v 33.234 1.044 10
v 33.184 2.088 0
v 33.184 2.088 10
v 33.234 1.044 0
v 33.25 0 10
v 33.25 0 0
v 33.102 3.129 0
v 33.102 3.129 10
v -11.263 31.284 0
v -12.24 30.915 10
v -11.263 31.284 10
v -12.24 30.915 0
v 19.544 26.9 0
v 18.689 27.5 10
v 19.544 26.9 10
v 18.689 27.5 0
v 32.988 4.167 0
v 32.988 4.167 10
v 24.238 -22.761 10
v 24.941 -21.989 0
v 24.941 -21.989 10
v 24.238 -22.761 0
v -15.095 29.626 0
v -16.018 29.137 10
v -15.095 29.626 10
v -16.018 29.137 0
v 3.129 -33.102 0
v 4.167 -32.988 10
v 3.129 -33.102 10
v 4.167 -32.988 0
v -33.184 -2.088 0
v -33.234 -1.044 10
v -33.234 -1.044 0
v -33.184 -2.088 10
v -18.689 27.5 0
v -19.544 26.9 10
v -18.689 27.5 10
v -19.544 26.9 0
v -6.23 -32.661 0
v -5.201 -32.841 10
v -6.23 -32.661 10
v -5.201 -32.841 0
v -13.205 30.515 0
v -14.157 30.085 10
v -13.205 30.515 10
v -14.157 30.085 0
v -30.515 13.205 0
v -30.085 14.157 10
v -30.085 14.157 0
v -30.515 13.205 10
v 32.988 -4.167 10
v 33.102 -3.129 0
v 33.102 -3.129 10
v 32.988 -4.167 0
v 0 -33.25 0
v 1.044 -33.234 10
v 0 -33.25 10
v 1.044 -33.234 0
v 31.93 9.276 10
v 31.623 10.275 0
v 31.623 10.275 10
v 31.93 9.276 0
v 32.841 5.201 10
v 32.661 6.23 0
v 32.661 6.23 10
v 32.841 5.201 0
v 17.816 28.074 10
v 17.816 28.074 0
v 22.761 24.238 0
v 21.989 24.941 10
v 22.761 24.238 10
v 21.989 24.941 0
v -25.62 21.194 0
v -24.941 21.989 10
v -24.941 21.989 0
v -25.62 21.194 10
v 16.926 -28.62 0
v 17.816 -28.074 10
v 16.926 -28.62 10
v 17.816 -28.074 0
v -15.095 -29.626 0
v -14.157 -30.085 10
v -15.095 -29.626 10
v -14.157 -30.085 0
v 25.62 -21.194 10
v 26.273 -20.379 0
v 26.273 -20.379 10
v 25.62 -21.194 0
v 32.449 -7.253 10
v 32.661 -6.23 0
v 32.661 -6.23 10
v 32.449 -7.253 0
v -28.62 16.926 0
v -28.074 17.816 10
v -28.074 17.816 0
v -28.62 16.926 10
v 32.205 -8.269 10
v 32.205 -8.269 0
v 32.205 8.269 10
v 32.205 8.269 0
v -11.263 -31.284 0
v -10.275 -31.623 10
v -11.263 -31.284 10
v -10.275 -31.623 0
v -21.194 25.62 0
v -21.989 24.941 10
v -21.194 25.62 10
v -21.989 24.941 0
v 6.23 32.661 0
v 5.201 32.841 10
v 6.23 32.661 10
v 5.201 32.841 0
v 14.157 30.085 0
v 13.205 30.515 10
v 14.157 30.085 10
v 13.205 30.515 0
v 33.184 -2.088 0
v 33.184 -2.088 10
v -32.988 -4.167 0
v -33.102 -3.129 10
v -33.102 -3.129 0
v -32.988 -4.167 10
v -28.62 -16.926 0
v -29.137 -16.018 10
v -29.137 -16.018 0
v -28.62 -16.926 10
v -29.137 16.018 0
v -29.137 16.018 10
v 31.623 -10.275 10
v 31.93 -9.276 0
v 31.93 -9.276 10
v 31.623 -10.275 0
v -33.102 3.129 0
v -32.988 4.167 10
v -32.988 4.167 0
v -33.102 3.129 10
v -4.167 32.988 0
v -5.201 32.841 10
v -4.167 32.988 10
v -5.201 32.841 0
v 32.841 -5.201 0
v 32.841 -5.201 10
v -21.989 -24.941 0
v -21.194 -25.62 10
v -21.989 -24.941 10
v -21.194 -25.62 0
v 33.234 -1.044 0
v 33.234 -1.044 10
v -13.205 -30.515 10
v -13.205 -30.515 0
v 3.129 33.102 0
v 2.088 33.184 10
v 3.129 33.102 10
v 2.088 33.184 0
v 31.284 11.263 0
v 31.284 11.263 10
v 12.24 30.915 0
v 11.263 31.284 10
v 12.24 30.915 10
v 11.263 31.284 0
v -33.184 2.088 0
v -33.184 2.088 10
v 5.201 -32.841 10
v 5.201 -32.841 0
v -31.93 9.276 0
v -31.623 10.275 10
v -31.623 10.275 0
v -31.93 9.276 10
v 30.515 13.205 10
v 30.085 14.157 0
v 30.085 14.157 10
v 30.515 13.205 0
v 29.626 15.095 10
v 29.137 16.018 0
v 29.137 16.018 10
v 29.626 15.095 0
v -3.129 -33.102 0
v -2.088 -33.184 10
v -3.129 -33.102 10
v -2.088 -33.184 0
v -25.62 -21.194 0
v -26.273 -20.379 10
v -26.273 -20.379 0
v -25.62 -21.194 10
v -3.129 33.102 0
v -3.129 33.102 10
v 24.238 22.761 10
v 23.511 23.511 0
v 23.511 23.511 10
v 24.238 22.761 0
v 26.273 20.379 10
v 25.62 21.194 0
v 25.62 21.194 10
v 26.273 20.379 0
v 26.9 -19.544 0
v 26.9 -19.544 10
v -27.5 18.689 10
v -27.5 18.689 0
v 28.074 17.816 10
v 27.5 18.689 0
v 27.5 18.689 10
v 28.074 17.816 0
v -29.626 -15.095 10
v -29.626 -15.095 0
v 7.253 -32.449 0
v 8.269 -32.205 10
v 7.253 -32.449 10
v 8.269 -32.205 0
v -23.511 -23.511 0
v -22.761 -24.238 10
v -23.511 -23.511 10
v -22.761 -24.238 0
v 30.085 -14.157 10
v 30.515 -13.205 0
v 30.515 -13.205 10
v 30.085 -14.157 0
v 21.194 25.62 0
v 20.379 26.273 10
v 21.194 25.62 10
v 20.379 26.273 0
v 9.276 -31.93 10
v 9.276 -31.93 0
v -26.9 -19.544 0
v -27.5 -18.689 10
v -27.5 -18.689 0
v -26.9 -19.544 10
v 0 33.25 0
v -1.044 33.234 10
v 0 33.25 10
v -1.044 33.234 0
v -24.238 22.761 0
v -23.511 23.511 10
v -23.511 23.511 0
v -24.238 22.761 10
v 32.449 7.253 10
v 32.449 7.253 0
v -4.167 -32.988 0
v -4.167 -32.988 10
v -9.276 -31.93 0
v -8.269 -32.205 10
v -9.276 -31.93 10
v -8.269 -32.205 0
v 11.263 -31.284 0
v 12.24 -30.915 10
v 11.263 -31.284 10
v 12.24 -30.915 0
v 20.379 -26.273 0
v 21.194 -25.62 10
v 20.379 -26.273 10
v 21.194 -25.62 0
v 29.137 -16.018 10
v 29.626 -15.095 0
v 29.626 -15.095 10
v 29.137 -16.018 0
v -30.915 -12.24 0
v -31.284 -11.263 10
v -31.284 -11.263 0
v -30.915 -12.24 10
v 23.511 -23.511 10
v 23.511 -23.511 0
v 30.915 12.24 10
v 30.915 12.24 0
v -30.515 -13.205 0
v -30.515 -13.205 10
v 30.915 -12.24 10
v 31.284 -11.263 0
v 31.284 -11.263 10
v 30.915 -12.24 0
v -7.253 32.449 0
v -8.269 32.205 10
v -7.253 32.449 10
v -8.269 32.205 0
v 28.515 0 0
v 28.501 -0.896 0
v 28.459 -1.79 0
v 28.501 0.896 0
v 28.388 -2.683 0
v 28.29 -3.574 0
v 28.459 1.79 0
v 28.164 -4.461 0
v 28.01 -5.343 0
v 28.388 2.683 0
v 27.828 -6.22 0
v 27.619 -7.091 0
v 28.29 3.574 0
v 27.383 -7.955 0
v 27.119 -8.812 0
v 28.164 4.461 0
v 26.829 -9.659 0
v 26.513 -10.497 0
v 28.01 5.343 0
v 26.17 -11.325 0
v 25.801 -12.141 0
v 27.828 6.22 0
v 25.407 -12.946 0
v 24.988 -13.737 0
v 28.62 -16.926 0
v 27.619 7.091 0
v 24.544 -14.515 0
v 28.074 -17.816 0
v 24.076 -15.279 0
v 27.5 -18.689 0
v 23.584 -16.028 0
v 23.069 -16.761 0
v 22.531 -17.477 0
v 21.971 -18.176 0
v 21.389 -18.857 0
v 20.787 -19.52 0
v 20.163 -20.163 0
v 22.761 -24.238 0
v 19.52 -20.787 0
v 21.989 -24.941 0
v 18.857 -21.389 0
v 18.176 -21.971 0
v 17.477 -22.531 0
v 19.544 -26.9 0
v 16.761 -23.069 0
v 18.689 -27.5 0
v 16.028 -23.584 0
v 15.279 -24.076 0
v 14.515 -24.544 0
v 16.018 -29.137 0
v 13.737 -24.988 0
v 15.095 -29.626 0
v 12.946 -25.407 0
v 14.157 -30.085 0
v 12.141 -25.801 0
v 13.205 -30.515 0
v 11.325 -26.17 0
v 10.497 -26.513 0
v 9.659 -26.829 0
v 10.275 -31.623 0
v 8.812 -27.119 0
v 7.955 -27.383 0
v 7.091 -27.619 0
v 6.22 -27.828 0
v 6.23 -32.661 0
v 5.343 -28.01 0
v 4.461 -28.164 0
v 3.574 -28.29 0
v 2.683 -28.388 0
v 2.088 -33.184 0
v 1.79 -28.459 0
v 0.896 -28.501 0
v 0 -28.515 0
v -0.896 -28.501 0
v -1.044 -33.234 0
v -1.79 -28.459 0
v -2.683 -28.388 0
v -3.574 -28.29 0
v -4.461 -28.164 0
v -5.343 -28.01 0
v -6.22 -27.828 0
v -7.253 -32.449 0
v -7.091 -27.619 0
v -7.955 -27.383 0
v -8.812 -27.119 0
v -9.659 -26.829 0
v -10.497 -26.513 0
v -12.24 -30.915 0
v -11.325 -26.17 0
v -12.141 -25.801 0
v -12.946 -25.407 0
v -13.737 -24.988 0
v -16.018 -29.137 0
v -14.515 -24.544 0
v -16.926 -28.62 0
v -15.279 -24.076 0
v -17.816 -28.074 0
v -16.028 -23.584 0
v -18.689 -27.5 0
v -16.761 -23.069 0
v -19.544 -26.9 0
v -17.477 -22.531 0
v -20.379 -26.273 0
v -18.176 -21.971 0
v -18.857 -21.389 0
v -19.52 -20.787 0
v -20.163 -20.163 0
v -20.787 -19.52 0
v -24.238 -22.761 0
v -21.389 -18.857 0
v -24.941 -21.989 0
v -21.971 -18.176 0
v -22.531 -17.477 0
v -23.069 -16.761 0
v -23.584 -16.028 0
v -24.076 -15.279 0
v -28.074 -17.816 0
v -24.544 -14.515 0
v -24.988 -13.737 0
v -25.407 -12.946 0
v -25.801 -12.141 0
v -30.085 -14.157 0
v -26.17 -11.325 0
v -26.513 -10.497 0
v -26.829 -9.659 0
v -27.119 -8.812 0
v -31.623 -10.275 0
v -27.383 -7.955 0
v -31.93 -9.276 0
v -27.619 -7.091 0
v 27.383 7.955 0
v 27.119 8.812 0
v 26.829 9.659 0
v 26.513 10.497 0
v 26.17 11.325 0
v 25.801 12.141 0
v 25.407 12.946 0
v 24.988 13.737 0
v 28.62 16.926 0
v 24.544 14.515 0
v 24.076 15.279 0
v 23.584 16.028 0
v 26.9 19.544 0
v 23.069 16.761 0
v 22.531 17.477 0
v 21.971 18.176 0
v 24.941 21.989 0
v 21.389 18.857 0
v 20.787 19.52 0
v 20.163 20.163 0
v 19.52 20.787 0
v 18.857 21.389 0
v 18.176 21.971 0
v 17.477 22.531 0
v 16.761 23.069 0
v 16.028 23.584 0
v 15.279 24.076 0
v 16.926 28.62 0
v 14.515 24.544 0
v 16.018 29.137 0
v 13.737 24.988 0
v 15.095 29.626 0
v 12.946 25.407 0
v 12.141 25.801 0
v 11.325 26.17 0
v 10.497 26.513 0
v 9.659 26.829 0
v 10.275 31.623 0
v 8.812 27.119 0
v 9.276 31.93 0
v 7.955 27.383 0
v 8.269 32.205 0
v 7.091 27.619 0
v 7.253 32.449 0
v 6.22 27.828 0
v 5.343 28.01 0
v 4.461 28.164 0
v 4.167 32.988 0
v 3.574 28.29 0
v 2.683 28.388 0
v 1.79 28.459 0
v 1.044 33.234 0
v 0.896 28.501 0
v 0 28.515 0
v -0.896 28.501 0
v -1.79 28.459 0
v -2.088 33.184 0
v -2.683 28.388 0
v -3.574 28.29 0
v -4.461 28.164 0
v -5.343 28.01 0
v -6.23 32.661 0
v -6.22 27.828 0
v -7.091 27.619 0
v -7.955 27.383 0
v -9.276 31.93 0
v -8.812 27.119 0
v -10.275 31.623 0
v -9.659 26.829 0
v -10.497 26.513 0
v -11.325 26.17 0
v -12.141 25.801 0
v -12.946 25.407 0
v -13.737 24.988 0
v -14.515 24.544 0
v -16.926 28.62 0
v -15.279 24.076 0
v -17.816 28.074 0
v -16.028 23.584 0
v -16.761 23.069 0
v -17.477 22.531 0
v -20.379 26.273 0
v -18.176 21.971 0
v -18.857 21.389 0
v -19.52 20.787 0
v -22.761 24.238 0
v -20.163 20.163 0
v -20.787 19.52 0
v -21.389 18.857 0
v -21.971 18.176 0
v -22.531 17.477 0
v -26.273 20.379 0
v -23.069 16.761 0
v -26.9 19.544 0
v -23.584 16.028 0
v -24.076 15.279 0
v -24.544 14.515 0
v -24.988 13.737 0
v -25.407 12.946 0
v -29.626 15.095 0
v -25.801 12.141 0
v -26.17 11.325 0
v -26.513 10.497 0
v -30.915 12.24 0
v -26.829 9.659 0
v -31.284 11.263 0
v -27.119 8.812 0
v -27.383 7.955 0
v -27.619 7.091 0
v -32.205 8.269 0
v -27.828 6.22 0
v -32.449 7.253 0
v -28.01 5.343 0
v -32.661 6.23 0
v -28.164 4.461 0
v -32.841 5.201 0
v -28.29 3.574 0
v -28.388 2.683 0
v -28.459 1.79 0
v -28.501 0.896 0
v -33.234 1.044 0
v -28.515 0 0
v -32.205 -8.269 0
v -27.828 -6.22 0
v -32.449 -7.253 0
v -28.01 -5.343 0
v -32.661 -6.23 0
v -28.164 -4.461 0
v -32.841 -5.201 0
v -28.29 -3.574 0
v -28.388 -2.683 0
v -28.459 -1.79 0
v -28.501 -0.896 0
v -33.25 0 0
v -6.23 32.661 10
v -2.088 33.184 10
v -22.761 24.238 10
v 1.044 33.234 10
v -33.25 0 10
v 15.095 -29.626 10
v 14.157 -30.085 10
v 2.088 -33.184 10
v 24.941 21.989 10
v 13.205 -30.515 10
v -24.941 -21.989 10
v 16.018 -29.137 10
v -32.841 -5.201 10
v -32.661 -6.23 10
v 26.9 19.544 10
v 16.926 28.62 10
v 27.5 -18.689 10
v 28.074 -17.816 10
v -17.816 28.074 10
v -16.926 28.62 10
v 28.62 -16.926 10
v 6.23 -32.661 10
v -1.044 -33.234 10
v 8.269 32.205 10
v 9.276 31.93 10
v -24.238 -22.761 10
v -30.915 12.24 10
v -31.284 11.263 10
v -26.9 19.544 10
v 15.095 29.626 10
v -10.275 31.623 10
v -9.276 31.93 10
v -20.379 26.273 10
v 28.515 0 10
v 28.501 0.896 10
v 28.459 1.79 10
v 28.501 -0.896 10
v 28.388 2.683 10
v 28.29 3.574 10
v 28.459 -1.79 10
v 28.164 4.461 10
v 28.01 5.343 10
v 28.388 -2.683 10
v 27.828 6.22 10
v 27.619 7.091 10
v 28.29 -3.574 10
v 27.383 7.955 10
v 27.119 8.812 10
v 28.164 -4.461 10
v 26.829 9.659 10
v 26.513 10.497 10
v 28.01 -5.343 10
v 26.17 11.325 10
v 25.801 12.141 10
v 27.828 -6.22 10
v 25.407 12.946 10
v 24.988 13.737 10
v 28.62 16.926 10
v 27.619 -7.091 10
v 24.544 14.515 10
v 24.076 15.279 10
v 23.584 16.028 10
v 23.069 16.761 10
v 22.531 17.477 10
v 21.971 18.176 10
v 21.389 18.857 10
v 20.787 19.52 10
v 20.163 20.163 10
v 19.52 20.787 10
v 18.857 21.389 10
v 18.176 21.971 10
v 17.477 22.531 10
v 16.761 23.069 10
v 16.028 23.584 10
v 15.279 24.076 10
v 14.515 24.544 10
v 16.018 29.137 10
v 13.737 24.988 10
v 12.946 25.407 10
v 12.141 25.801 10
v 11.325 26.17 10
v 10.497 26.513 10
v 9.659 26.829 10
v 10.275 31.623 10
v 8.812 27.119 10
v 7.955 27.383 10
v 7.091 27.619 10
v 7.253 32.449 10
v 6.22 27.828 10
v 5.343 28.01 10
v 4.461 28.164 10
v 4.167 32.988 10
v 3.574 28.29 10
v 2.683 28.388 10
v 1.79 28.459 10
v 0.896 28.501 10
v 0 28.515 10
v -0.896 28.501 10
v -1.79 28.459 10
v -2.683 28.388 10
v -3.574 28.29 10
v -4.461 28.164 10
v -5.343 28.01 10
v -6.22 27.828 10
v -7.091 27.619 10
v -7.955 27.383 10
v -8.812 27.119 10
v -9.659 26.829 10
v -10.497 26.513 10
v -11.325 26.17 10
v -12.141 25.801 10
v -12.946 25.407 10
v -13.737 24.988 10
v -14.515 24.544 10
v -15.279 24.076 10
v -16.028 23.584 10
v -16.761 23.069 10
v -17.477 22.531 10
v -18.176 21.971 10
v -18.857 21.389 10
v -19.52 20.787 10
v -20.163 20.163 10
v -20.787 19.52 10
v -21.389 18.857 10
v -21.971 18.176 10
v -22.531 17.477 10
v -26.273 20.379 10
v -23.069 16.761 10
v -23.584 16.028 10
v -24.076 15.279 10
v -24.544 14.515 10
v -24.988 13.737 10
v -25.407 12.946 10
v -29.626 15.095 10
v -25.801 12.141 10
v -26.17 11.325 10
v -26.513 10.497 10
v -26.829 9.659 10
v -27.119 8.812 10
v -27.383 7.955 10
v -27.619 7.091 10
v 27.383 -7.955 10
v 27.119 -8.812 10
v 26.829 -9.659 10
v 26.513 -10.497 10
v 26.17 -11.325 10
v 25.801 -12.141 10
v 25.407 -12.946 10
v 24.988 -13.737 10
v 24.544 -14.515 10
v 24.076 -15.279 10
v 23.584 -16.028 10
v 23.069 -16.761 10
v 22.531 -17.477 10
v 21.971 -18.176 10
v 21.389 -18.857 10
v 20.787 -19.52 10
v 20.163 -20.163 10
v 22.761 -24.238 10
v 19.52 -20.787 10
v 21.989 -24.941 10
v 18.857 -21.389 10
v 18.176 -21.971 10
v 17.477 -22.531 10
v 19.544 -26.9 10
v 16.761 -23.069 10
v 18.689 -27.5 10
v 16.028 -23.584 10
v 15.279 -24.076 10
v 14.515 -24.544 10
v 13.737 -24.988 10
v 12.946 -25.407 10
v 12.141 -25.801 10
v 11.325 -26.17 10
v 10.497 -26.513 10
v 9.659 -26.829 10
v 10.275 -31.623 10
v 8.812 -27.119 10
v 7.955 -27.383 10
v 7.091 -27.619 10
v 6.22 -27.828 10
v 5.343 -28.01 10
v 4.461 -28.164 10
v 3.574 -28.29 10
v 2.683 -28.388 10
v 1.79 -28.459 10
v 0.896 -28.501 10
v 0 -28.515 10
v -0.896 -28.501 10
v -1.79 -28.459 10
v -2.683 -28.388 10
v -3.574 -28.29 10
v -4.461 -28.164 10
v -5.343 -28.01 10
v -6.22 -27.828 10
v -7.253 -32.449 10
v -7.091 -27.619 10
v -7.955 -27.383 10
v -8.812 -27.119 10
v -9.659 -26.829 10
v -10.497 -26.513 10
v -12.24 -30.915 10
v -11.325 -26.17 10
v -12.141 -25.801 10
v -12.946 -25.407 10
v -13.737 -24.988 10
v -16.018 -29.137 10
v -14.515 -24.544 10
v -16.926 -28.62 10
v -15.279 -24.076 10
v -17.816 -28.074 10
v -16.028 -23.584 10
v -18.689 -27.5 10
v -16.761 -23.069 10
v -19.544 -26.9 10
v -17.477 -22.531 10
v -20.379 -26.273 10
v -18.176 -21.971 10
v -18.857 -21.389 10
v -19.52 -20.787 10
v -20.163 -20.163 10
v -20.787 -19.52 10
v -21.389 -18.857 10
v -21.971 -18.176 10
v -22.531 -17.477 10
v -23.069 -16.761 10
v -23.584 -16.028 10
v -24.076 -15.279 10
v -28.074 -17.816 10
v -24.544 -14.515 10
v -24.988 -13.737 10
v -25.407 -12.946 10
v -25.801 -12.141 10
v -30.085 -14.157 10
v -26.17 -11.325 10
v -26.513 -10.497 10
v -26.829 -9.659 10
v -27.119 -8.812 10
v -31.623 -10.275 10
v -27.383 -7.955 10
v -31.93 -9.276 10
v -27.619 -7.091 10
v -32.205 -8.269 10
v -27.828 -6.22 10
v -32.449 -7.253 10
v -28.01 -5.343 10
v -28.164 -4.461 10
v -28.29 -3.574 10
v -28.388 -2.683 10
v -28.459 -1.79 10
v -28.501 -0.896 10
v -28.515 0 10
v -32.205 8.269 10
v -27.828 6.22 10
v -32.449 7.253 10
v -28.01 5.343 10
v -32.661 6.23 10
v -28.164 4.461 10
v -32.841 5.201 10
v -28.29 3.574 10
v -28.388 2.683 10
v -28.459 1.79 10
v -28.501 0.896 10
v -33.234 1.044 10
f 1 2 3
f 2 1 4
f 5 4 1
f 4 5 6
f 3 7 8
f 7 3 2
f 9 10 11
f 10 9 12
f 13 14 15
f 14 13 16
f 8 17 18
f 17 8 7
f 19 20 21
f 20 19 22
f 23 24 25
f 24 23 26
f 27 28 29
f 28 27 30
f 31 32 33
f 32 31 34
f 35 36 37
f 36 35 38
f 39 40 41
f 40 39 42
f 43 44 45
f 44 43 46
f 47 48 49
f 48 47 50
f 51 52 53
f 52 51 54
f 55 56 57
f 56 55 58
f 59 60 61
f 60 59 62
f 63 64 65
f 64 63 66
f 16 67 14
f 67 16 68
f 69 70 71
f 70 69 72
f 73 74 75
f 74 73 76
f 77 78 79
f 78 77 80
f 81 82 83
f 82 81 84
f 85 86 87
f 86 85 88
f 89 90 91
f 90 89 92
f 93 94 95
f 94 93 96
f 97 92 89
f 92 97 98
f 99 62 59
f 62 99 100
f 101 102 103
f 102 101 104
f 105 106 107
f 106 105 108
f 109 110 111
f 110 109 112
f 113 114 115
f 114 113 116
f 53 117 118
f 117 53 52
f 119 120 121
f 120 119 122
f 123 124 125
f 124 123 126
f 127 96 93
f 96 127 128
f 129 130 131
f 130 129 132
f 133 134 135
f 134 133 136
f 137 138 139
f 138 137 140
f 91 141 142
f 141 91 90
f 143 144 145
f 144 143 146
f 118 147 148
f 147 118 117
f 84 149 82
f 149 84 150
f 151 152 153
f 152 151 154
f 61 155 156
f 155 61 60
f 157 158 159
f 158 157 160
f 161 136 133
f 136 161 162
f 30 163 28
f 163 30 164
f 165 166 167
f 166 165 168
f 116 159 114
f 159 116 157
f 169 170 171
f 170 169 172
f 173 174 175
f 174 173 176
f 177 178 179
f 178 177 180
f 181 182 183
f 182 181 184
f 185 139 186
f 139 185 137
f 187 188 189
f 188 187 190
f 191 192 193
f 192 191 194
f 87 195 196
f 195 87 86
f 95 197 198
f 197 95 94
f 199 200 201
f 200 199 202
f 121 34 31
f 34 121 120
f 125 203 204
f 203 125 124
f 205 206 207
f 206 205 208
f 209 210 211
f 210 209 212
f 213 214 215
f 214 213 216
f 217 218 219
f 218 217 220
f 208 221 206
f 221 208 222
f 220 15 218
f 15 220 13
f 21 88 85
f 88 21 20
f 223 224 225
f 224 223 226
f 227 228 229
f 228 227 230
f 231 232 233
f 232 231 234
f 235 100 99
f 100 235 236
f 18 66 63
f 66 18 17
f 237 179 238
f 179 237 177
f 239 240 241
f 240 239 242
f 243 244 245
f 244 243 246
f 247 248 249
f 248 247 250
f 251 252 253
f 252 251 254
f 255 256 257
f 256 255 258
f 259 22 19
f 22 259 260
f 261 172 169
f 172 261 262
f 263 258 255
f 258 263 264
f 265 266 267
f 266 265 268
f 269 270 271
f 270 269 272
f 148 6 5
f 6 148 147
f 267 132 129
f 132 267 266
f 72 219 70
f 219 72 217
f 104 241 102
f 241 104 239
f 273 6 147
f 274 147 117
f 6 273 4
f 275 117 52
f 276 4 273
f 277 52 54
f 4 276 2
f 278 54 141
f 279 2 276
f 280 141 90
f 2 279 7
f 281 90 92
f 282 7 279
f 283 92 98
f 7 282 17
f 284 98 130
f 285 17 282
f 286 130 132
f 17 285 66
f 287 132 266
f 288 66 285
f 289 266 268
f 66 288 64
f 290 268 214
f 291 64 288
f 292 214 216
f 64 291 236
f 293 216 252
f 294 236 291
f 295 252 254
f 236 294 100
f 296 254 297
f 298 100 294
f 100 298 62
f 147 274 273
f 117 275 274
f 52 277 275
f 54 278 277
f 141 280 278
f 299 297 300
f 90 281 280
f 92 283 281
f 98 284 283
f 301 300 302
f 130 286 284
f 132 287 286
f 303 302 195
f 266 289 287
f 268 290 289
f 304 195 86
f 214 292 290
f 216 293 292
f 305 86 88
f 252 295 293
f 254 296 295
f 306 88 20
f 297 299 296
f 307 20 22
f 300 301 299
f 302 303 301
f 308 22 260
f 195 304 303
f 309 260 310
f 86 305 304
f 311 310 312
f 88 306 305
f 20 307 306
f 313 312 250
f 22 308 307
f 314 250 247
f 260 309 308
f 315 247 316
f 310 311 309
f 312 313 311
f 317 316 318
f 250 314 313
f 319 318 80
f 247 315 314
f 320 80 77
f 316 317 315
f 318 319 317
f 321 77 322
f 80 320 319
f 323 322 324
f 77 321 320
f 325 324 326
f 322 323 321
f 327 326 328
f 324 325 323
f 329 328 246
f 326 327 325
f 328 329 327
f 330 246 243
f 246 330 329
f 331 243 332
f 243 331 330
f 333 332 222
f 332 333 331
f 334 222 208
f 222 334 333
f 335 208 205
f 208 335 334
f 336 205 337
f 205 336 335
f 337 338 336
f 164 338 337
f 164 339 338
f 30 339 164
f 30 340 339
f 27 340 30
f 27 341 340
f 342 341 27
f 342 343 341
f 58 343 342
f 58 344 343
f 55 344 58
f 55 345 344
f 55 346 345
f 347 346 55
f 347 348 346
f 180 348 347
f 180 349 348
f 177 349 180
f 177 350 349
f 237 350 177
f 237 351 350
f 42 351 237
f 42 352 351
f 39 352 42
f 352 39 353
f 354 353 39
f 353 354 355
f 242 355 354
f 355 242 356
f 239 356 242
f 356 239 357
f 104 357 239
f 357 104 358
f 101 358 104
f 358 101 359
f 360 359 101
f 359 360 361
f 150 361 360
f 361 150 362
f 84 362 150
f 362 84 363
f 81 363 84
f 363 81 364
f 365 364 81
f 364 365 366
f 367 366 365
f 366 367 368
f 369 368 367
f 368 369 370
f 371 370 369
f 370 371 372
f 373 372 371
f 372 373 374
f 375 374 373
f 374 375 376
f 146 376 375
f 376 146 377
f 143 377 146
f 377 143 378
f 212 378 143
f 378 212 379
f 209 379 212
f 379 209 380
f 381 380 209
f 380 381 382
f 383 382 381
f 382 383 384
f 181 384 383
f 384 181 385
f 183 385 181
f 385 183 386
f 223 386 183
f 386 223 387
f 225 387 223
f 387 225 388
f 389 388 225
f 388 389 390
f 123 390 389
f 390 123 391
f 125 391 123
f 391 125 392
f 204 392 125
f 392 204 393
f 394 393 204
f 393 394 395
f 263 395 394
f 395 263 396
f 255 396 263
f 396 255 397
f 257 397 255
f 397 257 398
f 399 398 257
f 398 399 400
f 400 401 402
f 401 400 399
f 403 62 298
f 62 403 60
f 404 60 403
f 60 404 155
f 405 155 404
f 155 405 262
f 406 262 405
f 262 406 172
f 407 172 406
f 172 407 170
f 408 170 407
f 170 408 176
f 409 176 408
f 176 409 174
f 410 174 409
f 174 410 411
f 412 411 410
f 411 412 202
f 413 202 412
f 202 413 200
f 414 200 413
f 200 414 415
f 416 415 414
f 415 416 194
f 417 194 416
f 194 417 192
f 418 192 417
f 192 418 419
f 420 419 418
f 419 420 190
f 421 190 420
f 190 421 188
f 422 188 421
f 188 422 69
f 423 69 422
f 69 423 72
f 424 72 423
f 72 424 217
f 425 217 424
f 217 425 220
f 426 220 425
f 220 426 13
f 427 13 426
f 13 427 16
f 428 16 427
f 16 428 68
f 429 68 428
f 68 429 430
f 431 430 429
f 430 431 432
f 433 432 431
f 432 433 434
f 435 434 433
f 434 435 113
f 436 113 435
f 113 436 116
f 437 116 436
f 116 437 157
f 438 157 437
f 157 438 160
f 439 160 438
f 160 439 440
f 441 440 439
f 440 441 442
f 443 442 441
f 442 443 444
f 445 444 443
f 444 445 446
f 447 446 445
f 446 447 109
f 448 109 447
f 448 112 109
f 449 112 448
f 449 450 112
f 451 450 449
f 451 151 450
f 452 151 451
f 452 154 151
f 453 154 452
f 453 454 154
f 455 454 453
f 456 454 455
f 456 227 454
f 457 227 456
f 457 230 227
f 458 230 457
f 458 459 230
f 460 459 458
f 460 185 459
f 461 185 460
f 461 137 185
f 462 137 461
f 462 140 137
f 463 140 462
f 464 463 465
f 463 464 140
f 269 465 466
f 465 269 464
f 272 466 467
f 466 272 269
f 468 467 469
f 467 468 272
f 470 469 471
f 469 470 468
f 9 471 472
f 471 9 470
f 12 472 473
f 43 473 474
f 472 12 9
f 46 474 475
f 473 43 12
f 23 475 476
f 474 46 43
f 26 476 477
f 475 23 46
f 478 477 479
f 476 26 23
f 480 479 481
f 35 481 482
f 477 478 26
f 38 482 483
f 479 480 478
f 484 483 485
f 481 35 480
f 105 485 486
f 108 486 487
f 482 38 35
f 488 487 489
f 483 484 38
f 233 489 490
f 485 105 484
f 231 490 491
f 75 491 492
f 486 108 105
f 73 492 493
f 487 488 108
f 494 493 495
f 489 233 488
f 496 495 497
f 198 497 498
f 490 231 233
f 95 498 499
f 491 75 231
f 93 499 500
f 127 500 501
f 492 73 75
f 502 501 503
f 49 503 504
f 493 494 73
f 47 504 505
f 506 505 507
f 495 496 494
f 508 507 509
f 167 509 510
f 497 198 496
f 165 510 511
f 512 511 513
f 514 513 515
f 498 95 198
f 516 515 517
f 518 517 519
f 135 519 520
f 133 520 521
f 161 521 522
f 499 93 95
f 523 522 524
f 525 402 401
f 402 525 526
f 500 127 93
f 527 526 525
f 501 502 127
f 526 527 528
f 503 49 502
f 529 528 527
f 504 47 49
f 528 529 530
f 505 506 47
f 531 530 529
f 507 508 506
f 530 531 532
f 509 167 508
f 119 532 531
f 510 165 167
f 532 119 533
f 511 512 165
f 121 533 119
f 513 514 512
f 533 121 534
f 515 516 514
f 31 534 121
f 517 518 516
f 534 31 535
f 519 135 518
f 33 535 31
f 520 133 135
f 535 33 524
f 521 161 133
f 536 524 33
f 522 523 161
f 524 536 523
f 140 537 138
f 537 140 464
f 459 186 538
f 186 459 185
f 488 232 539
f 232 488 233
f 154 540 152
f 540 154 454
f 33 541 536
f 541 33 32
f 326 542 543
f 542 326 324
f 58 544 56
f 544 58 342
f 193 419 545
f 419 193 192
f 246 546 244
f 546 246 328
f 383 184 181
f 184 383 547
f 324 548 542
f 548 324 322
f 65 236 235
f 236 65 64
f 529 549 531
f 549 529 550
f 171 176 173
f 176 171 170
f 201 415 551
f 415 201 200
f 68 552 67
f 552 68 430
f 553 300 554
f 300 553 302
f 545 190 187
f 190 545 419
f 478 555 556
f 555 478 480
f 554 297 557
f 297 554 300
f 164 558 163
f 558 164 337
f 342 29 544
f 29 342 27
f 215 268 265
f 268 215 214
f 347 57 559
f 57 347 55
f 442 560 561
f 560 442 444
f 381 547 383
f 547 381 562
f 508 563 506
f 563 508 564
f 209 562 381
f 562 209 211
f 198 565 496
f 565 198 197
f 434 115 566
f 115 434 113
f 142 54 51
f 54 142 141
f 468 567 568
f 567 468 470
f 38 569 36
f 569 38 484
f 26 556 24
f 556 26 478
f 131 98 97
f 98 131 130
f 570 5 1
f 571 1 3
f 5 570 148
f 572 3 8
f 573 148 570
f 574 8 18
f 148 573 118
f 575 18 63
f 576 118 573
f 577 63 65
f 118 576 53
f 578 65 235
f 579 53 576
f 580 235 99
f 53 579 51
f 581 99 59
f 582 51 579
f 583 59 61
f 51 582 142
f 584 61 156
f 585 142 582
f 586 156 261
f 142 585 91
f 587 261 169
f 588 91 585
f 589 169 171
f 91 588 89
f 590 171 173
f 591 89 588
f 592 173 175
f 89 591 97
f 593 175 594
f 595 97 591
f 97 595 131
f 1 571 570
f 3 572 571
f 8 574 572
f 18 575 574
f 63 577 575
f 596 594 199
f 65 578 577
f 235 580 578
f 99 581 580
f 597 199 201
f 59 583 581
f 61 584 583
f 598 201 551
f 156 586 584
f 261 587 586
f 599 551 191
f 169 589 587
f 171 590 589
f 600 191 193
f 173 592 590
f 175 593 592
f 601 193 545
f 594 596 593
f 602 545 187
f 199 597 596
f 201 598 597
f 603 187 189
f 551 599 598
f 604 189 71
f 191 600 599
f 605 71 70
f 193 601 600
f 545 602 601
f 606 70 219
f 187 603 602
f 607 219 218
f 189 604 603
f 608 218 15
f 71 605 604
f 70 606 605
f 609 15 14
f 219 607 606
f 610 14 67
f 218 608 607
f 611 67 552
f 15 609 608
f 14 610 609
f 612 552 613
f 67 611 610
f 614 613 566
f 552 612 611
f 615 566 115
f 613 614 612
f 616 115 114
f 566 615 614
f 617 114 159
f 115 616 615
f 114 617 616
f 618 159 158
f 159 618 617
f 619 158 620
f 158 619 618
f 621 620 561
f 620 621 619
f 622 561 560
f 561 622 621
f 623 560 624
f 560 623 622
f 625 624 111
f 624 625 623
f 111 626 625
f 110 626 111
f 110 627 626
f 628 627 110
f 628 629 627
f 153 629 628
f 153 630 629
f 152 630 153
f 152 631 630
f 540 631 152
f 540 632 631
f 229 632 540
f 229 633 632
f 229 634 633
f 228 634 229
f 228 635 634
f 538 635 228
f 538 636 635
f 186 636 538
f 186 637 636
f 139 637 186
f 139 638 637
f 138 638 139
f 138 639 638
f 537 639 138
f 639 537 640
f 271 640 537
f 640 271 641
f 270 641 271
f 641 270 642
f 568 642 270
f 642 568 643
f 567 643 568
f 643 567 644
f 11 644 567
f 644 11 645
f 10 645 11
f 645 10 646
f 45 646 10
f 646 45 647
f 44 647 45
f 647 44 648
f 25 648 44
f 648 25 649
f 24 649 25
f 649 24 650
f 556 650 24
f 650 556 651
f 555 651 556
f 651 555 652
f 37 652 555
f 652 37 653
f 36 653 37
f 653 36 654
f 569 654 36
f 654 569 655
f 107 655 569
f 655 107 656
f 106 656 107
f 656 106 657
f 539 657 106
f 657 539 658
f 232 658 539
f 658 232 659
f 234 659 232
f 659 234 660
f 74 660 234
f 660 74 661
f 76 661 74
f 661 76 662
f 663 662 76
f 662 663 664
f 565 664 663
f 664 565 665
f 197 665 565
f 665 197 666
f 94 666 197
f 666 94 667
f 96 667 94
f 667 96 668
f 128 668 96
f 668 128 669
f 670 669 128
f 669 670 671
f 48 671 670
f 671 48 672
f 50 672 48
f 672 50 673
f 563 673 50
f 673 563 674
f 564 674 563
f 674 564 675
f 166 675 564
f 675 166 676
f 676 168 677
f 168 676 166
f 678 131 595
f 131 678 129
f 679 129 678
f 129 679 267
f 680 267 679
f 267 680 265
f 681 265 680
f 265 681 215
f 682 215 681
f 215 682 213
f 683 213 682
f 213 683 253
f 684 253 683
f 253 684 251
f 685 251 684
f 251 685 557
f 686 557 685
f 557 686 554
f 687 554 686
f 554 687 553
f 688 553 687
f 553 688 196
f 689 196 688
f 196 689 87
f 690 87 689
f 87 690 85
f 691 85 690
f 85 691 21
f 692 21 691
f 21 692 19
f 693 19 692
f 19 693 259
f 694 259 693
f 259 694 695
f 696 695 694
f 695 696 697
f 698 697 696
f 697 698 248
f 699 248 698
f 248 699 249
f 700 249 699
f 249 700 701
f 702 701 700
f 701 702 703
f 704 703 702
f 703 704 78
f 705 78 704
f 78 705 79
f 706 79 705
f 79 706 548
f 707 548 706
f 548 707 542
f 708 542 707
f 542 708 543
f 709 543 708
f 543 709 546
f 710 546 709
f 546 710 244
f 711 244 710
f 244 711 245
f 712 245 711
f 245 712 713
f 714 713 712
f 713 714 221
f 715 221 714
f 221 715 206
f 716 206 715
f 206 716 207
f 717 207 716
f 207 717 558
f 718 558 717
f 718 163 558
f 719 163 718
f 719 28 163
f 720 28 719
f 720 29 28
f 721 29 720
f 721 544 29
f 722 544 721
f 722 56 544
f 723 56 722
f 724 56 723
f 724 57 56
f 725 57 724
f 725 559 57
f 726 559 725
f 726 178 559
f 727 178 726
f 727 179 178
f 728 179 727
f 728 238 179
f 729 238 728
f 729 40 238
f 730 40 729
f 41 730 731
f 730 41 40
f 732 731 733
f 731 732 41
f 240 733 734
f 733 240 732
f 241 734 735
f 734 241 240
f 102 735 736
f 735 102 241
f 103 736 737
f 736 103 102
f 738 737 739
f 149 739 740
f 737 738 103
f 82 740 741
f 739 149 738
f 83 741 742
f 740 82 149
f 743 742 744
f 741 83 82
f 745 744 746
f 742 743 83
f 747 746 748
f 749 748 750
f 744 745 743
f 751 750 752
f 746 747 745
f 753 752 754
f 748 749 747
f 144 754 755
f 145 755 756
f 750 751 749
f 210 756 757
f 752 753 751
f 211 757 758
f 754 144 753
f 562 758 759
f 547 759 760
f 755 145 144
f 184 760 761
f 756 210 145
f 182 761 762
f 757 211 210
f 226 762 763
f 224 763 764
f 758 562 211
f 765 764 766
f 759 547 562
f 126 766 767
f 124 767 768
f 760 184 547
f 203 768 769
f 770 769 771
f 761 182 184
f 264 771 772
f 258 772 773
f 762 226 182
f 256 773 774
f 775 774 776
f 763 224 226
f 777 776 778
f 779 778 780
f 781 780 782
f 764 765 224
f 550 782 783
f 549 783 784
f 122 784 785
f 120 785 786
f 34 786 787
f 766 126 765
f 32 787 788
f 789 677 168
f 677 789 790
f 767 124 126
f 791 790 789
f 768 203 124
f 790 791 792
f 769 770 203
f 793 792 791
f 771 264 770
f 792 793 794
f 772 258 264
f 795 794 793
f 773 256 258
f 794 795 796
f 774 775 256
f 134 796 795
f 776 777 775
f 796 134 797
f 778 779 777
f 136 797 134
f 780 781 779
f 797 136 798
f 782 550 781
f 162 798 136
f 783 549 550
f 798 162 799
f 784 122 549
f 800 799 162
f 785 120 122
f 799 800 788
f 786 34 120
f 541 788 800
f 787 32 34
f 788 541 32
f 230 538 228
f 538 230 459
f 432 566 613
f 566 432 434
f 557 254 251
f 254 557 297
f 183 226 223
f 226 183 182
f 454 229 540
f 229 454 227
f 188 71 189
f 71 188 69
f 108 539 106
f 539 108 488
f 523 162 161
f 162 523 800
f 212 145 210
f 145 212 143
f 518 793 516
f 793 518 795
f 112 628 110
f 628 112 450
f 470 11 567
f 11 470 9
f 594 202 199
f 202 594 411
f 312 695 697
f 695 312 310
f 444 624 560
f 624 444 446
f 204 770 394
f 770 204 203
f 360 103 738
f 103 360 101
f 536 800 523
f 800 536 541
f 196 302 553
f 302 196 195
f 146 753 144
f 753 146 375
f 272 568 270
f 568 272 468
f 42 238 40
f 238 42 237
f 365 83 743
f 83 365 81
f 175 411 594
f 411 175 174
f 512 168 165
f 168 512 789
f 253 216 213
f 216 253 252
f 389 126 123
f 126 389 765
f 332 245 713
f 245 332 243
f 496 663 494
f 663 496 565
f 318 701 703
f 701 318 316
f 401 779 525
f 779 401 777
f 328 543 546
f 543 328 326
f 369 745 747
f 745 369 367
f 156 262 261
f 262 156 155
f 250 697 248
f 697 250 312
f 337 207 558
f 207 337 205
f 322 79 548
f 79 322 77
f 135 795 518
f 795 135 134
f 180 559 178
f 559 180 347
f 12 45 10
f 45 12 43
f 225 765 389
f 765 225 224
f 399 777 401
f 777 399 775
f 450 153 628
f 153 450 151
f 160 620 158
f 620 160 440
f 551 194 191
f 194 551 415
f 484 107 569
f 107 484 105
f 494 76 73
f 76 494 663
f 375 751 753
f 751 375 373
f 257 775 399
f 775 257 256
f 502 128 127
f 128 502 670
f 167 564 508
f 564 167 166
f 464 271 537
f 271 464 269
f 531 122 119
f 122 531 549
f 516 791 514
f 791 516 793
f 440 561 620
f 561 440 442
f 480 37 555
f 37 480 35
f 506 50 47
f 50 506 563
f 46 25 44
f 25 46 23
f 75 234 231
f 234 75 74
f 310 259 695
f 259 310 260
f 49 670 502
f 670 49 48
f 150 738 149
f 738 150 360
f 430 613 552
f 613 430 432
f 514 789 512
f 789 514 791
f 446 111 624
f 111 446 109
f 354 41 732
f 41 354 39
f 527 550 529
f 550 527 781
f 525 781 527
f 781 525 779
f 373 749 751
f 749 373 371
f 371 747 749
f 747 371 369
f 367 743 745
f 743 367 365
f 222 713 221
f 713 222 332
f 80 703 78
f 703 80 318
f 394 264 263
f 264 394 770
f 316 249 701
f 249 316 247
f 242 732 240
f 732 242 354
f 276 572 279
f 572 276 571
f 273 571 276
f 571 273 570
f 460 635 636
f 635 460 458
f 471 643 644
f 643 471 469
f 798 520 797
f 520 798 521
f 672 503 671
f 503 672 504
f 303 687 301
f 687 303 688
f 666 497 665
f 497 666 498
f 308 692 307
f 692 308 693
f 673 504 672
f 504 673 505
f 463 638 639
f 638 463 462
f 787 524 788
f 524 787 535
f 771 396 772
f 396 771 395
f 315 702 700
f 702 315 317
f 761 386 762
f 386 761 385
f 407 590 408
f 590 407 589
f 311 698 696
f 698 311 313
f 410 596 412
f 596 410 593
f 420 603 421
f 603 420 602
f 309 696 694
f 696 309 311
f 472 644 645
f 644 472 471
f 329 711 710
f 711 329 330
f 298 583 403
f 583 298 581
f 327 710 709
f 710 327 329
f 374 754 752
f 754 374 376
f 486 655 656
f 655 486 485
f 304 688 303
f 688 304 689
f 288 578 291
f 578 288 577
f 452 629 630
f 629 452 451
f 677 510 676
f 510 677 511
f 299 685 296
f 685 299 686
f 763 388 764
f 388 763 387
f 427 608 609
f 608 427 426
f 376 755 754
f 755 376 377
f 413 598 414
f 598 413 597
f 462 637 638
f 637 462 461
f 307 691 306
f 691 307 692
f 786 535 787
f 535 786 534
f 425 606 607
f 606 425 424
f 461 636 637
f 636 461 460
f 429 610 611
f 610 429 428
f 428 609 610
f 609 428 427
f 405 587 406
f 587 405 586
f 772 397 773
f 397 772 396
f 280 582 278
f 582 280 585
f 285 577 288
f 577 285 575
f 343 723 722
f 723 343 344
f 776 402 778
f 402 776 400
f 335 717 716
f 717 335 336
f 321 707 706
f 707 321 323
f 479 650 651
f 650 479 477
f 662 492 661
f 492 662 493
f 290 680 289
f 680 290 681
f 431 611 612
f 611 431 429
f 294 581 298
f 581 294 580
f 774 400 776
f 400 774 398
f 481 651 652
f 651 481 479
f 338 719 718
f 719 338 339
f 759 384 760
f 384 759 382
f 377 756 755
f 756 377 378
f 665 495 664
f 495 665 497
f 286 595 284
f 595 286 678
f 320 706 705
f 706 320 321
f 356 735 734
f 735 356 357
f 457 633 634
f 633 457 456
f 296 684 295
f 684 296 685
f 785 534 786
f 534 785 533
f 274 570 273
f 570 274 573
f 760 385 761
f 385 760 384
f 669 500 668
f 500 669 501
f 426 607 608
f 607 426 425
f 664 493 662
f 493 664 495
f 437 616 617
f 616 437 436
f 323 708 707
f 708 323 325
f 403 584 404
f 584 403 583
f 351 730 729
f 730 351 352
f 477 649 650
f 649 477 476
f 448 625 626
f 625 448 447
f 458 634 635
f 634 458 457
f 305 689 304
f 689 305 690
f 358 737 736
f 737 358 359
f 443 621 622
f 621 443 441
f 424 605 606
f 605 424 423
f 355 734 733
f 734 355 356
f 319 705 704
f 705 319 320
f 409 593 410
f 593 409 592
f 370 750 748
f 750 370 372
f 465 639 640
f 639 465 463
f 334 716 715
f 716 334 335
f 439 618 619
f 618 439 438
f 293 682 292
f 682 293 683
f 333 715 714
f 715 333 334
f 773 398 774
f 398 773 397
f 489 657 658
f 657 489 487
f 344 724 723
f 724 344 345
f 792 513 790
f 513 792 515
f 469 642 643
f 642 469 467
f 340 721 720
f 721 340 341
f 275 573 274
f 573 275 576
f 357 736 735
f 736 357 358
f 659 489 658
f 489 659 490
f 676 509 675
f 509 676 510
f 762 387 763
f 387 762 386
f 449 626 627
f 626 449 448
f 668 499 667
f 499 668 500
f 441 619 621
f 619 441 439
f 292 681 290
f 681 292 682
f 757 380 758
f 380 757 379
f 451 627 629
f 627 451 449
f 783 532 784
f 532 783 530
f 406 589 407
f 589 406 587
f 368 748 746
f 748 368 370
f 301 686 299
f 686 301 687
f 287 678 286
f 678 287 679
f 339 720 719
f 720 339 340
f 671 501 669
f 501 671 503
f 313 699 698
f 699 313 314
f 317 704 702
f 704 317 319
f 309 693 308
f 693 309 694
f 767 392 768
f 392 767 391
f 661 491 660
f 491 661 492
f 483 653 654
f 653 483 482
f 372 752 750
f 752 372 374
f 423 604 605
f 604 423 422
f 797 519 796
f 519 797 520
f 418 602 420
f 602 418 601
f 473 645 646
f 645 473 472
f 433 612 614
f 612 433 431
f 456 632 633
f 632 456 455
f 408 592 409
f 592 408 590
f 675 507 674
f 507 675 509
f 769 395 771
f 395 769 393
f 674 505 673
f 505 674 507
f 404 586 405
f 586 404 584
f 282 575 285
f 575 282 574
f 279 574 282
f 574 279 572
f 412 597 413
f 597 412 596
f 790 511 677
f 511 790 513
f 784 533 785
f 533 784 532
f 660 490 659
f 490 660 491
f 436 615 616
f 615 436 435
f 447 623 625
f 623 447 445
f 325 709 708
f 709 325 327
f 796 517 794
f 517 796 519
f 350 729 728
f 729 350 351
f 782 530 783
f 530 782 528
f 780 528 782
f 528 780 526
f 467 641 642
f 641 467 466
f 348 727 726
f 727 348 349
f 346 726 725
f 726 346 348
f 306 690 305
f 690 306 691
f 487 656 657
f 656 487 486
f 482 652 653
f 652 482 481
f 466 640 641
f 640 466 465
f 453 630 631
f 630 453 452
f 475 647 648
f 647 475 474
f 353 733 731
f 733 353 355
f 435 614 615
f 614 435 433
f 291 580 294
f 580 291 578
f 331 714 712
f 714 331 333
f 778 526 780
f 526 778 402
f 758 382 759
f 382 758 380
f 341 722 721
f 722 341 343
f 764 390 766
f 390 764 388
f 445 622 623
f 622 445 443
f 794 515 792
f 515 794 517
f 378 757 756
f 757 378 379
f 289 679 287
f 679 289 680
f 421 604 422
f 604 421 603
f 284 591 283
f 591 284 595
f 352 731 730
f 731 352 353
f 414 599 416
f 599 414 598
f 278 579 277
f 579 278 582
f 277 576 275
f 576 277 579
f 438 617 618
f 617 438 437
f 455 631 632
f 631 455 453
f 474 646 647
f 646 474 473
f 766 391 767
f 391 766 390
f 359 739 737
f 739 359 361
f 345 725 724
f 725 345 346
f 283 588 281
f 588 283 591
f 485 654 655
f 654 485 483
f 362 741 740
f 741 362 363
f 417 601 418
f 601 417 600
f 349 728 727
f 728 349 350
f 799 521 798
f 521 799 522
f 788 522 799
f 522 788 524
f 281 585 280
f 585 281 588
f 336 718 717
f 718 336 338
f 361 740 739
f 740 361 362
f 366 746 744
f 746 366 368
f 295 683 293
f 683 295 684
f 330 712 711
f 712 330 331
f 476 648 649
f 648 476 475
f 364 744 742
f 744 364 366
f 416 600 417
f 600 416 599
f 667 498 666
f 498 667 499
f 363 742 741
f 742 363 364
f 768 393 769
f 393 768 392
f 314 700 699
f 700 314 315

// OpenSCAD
$fn=200;
difference(){
    cylinder(h=10, d=66.5);
    cylinder(h=10, d=57.03);
}
